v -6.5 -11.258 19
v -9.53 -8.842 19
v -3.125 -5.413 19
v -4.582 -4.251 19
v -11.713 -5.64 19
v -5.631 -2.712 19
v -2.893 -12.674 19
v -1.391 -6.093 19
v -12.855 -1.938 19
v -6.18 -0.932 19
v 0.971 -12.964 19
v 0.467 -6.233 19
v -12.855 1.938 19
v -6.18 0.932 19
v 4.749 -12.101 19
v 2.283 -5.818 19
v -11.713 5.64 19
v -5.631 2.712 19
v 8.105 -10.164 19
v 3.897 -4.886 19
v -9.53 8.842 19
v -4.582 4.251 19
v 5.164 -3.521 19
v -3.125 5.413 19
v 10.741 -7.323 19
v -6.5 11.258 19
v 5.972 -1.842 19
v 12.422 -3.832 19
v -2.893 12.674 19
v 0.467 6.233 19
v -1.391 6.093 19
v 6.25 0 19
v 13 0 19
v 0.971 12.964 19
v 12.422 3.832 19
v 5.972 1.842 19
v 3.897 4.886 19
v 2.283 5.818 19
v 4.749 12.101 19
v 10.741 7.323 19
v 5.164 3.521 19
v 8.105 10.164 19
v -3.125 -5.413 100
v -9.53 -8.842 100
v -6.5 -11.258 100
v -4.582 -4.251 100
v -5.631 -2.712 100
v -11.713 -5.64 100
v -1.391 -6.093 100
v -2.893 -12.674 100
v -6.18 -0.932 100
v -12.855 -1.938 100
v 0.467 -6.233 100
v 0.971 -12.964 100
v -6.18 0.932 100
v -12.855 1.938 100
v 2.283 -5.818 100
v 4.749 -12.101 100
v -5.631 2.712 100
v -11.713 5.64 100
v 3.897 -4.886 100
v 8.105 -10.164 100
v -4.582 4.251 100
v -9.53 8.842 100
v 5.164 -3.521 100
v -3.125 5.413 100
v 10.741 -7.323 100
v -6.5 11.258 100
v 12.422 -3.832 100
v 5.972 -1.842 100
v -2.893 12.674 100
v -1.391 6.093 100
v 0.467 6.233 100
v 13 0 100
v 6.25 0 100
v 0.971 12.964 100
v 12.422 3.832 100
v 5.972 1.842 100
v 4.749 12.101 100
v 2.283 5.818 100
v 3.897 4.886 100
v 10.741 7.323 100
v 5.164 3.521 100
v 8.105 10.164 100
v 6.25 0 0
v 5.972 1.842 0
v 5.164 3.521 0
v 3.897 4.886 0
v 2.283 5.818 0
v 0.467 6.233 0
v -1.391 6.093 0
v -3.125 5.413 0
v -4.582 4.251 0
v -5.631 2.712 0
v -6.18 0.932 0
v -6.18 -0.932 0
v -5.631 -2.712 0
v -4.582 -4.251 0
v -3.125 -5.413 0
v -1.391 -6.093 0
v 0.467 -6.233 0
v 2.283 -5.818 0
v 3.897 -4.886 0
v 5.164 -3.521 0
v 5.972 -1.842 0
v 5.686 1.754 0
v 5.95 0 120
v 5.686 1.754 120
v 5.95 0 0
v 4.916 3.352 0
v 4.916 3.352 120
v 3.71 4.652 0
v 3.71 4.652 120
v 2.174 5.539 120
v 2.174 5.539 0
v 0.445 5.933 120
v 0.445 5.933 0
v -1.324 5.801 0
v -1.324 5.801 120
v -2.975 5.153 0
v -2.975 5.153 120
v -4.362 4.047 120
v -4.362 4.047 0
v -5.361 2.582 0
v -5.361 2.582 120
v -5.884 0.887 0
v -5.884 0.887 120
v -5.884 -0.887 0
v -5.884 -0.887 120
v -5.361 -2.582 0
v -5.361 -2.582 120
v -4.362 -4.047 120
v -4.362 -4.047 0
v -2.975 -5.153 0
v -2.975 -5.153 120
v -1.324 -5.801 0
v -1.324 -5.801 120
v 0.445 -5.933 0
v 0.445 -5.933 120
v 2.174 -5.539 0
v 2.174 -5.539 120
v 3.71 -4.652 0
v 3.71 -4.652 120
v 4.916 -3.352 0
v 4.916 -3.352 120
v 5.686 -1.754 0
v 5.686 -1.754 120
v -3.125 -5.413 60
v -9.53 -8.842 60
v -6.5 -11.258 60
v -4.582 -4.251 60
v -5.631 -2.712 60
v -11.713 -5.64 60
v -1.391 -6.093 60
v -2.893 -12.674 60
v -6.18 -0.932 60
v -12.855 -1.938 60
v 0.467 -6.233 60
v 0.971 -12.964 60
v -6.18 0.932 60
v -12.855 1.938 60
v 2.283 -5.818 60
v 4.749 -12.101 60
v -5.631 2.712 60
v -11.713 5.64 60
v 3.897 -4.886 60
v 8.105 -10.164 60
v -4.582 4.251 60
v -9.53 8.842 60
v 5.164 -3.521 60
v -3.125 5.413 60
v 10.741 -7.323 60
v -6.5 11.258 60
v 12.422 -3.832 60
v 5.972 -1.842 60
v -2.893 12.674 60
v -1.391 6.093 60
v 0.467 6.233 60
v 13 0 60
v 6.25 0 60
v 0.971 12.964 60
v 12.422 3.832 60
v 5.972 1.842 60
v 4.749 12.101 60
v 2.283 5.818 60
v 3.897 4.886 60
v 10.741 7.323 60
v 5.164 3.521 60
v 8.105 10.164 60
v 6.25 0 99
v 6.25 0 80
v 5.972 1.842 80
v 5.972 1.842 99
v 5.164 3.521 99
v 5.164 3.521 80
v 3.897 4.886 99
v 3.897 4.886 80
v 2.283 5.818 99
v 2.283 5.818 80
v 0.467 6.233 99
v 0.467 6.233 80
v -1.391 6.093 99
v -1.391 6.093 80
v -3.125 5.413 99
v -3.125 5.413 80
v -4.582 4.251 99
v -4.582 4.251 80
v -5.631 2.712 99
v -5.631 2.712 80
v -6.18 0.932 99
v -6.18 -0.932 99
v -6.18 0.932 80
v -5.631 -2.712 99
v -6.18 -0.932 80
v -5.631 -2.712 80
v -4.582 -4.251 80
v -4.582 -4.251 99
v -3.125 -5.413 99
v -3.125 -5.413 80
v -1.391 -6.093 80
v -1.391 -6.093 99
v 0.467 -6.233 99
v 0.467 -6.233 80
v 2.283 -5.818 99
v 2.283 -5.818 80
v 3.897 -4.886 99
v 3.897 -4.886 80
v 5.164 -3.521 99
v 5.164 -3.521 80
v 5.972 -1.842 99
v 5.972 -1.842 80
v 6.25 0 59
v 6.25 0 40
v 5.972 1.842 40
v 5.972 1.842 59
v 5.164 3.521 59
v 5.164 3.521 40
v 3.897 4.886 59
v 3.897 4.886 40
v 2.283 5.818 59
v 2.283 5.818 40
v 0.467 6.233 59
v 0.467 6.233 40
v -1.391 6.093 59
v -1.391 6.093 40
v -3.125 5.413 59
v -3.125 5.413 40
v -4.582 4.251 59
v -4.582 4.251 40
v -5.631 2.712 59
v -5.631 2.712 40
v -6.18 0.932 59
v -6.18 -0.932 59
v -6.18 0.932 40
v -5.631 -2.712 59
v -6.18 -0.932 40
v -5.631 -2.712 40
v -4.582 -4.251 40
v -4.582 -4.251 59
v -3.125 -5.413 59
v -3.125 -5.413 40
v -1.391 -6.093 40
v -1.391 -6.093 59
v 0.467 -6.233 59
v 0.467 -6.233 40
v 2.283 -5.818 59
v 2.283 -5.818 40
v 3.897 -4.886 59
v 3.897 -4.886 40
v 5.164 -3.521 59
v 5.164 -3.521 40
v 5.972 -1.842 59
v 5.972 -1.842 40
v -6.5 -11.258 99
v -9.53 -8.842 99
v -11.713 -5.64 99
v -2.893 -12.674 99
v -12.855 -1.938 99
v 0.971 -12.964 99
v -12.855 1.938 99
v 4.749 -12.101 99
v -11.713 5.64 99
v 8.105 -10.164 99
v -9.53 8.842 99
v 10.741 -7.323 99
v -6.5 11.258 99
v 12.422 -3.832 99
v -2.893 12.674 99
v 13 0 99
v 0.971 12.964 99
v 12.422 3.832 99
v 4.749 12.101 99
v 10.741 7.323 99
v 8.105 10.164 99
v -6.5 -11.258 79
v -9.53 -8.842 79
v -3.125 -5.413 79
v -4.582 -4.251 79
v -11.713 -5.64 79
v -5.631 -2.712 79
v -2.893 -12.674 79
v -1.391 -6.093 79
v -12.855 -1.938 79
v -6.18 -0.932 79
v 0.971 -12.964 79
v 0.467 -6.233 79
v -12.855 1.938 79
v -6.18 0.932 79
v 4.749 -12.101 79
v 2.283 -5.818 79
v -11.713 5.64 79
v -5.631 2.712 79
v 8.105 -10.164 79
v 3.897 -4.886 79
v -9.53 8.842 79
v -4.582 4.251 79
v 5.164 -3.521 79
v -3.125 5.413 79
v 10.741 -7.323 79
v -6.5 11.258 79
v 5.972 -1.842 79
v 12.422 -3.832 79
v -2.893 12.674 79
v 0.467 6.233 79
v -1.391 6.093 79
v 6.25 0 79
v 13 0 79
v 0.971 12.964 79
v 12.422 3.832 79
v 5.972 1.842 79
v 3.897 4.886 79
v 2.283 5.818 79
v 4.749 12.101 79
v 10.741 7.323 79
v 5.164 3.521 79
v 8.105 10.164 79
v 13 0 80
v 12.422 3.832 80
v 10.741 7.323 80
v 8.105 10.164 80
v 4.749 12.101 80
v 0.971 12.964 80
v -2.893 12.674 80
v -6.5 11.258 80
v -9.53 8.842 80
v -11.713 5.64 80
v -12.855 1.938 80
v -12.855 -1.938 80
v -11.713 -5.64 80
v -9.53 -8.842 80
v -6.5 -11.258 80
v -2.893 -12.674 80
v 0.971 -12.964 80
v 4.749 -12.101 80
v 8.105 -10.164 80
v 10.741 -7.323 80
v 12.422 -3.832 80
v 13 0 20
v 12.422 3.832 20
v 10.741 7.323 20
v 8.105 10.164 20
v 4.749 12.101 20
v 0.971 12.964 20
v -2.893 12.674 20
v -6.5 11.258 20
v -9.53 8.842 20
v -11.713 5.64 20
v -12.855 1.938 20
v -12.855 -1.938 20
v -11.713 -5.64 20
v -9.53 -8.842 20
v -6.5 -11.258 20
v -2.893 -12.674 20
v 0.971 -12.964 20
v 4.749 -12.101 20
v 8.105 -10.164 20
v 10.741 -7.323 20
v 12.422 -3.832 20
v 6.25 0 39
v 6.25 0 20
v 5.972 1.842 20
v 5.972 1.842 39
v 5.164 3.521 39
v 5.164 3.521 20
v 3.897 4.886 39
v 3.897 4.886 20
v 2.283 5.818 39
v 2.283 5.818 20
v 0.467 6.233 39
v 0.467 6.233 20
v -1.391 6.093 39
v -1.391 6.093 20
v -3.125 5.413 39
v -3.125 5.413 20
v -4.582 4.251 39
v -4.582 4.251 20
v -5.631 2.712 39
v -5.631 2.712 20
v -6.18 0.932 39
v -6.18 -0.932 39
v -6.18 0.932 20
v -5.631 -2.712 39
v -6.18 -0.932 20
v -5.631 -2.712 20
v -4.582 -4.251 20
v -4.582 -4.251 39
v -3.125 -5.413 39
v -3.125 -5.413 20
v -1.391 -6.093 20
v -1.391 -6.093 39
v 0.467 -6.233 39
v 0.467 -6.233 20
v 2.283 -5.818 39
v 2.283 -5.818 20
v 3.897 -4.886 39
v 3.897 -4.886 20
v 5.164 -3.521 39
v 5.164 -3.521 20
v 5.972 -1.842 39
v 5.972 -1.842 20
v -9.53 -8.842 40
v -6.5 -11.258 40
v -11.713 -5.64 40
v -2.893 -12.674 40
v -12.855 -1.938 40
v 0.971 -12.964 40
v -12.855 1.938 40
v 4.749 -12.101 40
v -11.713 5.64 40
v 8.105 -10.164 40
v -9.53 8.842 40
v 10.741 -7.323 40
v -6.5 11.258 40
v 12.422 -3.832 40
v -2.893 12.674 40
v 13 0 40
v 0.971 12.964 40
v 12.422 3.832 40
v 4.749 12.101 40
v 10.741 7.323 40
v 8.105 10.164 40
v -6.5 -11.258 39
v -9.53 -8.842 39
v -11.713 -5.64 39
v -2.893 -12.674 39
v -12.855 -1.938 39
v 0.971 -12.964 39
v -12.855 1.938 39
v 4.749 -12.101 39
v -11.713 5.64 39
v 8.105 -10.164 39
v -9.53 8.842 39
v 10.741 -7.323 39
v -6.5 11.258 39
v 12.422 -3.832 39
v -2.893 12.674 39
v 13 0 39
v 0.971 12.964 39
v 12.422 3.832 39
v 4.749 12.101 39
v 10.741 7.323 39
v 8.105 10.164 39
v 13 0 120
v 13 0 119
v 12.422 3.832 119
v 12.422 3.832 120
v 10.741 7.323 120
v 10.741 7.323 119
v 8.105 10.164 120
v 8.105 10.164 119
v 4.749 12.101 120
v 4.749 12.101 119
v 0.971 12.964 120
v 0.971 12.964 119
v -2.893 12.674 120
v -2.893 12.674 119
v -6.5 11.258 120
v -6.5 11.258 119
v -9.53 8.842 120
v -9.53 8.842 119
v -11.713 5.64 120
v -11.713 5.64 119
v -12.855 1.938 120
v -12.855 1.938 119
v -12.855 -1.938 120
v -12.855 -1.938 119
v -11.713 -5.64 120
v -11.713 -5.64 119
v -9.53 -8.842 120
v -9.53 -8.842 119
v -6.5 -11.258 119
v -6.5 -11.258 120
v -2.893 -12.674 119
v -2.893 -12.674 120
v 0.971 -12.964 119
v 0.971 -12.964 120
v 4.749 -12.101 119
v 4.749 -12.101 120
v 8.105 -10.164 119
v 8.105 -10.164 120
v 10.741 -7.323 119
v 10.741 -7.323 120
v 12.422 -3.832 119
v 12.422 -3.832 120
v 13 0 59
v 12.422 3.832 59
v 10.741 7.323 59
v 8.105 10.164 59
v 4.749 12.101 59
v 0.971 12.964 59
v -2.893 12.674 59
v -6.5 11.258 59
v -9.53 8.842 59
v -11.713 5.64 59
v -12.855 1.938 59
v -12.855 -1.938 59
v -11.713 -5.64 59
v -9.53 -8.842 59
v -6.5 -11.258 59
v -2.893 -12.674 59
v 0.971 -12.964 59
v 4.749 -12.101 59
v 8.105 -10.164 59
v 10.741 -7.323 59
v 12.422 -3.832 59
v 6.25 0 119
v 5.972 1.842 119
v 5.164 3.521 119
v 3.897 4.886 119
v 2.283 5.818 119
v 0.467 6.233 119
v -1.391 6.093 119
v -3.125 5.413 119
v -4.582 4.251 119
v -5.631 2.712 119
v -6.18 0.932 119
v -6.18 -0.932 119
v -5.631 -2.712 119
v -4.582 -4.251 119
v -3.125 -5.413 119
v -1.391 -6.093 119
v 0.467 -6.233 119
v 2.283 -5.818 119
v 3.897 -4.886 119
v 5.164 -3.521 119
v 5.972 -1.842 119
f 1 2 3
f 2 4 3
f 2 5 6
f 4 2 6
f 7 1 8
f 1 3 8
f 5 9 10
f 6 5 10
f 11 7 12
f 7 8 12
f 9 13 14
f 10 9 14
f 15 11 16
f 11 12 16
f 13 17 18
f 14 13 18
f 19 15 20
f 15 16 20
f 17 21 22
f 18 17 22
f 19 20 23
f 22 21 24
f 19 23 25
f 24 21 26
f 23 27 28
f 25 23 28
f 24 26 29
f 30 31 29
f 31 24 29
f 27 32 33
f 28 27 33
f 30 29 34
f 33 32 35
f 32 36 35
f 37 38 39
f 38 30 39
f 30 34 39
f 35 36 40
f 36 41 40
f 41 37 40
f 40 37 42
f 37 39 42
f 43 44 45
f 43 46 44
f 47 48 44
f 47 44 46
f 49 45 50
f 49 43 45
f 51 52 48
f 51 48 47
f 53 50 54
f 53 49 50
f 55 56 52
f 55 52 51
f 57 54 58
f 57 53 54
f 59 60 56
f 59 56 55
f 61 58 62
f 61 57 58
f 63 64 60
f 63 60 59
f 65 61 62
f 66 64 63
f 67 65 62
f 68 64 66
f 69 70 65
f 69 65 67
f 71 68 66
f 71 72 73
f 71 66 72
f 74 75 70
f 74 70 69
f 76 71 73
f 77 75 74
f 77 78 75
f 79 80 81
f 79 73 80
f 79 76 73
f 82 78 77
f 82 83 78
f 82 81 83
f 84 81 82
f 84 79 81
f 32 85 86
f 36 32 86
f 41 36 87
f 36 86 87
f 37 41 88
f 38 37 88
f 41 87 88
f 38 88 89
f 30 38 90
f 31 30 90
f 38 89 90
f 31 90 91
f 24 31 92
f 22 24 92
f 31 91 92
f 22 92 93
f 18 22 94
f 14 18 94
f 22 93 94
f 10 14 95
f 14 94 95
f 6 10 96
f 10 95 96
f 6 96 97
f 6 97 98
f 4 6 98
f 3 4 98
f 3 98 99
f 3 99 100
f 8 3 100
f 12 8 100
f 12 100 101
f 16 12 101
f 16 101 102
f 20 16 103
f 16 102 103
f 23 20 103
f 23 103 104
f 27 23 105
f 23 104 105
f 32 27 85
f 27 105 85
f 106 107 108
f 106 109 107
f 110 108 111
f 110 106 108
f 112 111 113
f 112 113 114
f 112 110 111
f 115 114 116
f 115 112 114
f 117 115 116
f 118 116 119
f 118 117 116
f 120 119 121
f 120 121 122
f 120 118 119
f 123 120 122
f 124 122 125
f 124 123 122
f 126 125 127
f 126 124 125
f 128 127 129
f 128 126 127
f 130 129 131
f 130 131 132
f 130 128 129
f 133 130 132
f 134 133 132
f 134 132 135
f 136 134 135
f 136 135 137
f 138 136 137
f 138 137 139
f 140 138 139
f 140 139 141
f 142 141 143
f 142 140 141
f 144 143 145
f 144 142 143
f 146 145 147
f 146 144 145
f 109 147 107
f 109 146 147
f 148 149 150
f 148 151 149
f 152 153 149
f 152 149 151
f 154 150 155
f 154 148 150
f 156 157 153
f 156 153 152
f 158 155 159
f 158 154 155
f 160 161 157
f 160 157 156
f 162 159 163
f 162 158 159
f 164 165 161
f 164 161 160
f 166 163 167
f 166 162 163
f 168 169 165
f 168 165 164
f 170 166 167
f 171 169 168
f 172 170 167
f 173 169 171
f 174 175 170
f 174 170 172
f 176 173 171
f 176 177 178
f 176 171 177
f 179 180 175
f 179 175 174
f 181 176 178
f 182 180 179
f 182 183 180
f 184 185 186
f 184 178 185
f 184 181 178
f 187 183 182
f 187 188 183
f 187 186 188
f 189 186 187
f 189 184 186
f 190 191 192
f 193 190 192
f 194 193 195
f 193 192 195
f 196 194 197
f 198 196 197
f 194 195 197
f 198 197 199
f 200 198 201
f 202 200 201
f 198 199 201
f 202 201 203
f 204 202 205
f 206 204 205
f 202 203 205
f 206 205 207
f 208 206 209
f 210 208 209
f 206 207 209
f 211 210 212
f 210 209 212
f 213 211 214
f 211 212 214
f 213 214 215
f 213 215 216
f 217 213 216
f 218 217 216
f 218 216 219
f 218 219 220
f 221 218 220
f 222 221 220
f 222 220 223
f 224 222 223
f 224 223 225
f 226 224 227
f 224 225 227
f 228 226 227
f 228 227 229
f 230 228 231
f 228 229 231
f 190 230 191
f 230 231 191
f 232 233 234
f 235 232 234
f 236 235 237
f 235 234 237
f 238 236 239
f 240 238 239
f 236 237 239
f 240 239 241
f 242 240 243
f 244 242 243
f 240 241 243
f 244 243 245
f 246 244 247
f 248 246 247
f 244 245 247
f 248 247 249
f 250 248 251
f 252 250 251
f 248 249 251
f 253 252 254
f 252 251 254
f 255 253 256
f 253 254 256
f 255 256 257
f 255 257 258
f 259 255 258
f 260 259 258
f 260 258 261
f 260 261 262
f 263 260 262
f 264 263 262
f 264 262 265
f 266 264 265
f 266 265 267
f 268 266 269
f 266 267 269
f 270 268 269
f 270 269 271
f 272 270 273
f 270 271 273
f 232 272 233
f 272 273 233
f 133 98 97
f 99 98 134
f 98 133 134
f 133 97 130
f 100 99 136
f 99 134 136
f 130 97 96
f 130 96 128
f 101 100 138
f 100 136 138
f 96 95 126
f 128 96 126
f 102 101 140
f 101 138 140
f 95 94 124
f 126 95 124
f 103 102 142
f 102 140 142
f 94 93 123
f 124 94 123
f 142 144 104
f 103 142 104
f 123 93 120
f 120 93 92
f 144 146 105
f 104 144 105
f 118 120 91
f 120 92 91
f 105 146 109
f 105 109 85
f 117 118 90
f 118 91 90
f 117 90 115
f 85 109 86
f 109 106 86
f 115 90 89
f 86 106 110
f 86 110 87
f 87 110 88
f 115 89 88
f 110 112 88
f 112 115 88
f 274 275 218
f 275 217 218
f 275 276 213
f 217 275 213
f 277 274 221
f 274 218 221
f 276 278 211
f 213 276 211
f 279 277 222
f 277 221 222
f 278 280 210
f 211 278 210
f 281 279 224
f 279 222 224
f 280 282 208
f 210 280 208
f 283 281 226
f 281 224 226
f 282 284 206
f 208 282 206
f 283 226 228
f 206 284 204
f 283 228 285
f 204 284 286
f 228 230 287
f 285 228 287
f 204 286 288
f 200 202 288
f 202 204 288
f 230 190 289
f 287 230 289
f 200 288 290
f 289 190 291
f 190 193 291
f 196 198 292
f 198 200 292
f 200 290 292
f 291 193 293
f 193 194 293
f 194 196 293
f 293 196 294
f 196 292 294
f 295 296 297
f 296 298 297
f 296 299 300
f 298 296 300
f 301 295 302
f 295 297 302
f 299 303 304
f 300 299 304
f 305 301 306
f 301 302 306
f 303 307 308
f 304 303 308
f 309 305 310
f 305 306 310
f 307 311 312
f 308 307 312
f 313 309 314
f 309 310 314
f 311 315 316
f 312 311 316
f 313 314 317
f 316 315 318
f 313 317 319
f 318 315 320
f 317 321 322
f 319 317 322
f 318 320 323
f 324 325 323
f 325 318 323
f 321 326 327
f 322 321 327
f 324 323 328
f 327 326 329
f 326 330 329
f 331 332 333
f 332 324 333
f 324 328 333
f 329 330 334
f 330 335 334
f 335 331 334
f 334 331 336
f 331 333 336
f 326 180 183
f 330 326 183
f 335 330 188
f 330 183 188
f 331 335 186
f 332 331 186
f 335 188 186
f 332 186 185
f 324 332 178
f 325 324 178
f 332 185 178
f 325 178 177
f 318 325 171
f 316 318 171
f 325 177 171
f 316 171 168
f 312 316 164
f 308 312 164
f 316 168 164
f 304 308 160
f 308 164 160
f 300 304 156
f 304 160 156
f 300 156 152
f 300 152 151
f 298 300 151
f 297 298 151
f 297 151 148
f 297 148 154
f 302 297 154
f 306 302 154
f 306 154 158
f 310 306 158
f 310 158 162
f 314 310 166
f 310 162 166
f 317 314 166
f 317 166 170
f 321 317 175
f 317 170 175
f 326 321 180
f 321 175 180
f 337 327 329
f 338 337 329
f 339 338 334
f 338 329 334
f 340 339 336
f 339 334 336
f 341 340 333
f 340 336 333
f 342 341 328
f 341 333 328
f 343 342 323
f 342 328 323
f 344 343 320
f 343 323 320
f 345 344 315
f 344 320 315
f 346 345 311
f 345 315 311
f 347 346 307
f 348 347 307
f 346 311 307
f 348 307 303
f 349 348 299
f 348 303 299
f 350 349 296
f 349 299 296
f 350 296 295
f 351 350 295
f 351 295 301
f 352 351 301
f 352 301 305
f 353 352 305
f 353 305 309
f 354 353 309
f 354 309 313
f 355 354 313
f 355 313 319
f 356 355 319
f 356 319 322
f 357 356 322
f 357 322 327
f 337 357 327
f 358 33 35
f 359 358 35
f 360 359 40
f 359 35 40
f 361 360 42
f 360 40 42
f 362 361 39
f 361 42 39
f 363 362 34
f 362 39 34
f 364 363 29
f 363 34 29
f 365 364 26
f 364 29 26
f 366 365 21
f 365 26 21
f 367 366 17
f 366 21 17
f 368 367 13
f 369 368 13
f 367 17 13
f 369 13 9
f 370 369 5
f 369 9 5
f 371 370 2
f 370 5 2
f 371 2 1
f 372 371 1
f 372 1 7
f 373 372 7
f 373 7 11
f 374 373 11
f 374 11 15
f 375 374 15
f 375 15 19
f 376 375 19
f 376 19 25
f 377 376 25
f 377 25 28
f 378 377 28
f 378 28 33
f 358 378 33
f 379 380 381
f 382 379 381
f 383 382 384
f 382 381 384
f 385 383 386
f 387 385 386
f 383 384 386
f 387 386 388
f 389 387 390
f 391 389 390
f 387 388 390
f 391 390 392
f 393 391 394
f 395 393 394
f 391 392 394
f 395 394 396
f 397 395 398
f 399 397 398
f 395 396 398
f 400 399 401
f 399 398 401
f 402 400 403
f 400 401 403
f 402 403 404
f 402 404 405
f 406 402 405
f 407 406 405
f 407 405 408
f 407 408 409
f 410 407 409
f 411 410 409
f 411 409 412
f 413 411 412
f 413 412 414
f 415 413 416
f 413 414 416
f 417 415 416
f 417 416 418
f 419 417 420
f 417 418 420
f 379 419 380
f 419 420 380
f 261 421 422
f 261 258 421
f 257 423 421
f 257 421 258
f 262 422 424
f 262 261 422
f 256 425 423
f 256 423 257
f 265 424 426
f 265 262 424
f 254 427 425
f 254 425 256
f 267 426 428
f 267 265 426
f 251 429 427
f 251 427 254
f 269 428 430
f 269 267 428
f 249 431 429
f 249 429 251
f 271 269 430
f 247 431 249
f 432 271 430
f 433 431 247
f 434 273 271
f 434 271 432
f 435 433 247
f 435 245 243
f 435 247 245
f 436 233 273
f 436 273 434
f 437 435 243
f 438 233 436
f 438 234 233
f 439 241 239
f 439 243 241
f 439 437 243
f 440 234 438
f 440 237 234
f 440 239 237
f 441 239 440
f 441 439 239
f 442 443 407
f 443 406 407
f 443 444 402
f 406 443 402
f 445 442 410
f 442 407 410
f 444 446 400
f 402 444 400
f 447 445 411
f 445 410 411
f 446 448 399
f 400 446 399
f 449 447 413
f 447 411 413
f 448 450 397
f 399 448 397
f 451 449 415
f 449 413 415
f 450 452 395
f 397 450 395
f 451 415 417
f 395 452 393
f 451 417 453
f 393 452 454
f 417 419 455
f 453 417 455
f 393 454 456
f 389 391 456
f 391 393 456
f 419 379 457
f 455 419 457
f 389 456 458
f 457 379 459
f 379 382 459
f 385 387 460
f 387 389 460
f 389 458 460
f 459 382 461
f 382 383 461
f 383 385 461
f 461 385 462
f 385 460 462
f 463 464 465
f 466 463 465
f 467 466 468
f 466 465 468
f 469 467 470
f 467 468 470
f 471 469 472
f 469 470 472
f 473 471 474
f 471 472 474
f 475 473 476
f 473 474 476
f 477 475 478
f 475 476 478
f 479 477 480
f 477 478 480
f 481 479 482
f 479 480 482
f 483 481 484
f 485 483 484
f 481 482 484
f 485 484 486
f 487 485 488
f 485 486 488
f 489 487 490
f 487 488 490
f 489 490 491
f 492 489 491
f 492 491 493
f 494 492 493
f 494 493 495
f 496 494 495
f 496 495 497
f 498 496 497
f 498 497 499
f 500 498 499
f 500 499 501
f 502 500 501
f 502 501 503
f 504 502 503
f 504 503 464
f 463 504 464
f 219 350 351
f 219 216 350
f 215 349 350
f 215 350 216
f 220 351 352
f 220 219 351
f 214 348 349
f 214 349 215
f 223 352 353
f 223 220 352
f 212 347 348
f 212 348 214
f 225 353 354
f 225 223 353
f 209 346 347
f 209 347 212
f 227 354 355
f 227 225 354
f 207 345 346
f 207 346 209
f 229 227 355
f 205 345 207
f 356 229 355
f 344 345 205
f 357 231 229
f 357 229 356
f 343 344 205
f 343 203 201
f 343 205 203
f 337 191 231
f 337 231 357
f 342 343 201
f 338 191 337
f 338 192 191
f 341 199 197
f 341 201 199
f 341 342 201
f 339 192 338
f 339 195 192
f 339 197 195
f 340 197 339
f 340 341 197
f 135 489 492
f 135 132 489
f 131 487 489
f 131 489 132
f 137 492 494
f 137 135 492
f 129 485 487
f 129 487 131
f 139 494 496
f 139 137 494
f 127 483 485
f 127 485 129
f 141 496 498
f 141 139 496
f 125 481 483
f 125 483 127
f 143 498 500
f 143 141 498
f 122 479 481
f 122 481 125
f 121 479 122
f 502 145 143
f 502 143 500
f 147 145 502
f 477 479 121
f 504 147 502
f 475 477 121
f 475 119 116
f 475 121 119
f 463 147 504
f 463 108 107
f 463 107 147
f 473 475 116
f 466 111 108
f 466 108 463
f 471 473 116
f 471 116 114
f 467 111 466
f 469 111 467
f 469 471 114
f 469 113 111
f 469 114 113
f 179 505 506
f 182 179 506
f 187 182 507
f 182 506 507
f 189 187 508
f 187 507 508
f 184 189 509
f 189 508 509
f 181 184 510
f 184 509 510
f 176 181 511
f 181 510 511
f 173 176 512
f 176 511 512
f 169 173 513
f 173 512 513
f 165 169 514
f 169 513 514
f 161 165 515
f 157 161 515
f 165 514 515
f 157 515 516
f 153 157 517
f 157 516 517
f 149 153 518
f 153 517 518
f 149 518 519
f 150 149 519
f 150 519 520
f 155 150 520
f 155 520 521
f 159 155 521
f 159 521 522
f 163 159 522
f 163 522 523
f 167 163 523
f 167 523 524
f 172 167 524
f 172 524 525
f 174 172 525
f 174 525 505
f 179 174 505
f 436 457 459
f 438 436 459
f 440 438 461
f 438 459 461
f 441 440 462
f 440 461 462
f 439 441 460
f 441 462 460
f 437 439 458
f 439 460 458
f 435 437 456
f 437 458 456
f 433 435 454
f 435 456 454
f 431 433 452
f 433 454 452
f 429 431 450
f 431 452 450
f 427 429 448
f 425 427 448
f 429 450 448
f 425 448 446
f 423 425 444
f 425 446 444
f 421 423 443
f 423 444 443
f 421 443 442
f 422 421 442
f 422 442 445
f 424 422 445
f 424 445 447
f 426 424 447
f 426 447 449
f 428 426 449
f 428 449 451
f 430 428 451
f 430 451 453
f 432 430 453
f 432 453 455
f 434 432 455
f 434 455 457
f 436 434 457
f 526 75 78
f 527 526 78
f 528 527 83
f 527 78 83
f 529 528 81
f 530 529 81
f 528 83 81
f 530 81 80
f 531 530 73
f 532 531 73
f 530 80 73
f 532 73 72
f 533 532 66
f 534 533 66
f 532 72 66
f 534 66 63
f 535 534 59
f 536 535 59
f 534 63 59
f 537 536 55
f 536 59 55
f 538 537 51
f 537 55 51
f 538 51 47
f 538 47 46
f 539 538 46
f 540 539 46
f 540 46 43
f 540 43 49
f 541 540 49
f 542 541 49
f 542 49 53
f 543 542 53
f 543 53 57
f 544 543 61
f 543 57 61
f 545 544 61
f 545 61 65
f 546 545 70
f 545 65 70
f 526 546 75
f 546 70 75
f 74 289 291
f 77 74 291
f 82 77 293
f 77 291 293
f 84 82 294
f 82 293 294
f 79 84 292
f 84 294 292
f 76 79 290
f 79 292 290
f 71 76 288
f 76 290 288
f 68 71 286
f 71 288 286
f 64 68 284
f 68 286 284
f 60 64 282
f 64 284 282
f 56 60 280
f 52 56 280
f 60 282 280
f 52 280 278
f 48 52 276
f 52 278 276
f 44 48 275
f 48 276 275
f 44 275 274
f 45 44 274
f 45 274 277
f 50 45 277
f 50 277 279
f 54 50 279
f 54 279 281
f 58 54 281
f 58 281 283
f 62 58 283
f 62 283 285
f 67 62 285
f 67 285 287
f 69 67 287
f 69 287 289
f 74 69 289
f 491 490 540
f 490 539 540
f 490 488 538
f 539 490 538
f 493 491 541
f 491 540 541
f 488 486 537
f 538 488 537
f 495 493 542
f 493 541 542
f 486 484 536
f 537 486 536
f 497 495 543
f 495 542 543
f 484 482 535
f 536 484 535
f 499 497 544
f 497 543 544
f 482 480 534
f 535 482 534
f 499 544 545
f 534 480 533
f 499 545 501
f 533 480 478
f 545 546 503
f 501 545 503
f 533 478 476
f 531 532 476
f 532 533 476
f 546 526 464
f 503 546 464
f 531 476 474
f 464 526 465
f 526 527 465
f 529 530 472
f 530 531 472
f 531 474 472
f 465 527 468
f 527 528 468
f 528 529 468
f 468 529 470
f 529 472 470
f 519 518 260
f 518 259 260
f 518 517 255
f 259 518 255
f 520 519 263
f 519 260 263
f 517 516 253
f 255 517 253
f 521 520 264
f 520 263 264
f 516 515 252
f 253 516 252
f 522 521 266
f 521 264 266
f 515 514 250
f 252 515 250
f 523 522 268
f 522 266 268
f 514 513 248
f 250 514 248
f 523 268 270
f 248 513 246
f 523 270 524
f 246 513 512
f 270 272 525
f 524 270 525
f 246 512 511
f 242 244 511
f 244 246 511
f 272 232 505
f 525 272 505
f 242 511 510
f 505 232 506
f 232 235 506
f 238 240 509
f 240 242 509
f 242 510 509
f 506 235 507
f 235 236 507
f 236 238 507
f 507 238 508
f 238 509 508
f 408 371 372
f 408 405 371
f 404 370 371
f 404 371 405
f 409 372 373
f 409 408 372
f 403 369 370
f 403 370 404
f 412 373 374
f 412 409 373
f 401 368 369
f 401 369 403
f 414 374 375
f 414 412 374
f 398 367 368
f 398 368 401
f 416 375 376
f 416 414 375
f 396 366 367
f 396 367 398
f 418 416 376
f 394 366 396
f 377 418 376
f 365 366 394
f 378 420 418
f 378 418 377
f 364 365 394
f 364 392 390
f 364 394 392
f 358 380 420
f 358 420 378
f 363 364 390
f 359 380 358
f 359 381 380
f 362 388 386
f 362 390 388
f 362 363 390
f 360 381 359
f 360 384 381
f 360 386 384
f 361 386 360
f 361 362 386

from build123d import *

# Parameters (mm, degrees)
SKETCH003_R     = 13
SKETCH003_R_2   = 5.95
PAD001_DEPTH    = 20
SKETCH004_R     = 13
SKETCH004_R_2   = 6.25
POCKET001_DEPTH = 19


with BuildPart() as coil:
    # Sketch003 → Pad001 (new body)
    with BuildSketch(Plane.XY):
        Circle(SKETCH003_R)
        Circle(SKETCH003_R_2, mode=Mode.SUBTRACT)
    extrude(amount=PAD001_DEPTH)

    # Sketch004 → Pocket001 (cut)
    with BuildSketch(Plane.XY):
        Circle(SKETCH004_R)
        Circle(SKETCH004_R_2, mode=Mode.SUBTRACT)
    extrude(amount=POCKET001_DEPTH, mode=Mode.SUBTRACT)


with BuildPart() as coil001:
    # Body003 base: copy of coil
    add(coil.part)


with BuildPart() as coil001_1:
    # Body003 placement: moved
    add(coil001.part.moved(Location((0, 0, 20))))


with BuildPart() as coil002:
    # Body004 base: copy of coil001
    add(coil001_1.part)


with BuildPart() as coil002_1:
    # Clone001 placement: moved
    add(coil002.part.moved(Location((0, 0, -20))))


with BuildPart() as coil002_2:
    # Body004 placement: moved
    add(coil002_1.part.moved(Location((0, 0, 40))))


with BuildPart() as coil003:
    # Body005 base: copy of coil
    add(coil.part)


with BuildPart() as coil003_1:
    # Body005 placement: moved
    add(coil003.part.moved(Location((0, 0, 60))))


with BuildPart() as coil004:
    # Body006 base: copy of coil
    add(coil.part)


with BuildPart() as coil004_1:
    # Body006 placement: moved
    add(coil004.part.moved(Location((0, 0, 80))))


with BuildPart() as coil005:
    # Body012 base: copy of coil
    add(coil.part)


with BuildPart() as coil005_1:
    # Body012 placement: moved
    add(coil005.part.moved(Location((0, 0, 100))))


with BuildPart() as coilsfusion:
    # Fusion base: copy of coil
    add(coil.part)

    # Fusion: union coil001, coil002, coil003, coil004, coil005
    add(coil001_1.part)
    add(coil002_2.part)
    add(coil003_1.part)
    add(coil004_1.part)
    add(coil005_1.part)


solid = coilsfusion.part
